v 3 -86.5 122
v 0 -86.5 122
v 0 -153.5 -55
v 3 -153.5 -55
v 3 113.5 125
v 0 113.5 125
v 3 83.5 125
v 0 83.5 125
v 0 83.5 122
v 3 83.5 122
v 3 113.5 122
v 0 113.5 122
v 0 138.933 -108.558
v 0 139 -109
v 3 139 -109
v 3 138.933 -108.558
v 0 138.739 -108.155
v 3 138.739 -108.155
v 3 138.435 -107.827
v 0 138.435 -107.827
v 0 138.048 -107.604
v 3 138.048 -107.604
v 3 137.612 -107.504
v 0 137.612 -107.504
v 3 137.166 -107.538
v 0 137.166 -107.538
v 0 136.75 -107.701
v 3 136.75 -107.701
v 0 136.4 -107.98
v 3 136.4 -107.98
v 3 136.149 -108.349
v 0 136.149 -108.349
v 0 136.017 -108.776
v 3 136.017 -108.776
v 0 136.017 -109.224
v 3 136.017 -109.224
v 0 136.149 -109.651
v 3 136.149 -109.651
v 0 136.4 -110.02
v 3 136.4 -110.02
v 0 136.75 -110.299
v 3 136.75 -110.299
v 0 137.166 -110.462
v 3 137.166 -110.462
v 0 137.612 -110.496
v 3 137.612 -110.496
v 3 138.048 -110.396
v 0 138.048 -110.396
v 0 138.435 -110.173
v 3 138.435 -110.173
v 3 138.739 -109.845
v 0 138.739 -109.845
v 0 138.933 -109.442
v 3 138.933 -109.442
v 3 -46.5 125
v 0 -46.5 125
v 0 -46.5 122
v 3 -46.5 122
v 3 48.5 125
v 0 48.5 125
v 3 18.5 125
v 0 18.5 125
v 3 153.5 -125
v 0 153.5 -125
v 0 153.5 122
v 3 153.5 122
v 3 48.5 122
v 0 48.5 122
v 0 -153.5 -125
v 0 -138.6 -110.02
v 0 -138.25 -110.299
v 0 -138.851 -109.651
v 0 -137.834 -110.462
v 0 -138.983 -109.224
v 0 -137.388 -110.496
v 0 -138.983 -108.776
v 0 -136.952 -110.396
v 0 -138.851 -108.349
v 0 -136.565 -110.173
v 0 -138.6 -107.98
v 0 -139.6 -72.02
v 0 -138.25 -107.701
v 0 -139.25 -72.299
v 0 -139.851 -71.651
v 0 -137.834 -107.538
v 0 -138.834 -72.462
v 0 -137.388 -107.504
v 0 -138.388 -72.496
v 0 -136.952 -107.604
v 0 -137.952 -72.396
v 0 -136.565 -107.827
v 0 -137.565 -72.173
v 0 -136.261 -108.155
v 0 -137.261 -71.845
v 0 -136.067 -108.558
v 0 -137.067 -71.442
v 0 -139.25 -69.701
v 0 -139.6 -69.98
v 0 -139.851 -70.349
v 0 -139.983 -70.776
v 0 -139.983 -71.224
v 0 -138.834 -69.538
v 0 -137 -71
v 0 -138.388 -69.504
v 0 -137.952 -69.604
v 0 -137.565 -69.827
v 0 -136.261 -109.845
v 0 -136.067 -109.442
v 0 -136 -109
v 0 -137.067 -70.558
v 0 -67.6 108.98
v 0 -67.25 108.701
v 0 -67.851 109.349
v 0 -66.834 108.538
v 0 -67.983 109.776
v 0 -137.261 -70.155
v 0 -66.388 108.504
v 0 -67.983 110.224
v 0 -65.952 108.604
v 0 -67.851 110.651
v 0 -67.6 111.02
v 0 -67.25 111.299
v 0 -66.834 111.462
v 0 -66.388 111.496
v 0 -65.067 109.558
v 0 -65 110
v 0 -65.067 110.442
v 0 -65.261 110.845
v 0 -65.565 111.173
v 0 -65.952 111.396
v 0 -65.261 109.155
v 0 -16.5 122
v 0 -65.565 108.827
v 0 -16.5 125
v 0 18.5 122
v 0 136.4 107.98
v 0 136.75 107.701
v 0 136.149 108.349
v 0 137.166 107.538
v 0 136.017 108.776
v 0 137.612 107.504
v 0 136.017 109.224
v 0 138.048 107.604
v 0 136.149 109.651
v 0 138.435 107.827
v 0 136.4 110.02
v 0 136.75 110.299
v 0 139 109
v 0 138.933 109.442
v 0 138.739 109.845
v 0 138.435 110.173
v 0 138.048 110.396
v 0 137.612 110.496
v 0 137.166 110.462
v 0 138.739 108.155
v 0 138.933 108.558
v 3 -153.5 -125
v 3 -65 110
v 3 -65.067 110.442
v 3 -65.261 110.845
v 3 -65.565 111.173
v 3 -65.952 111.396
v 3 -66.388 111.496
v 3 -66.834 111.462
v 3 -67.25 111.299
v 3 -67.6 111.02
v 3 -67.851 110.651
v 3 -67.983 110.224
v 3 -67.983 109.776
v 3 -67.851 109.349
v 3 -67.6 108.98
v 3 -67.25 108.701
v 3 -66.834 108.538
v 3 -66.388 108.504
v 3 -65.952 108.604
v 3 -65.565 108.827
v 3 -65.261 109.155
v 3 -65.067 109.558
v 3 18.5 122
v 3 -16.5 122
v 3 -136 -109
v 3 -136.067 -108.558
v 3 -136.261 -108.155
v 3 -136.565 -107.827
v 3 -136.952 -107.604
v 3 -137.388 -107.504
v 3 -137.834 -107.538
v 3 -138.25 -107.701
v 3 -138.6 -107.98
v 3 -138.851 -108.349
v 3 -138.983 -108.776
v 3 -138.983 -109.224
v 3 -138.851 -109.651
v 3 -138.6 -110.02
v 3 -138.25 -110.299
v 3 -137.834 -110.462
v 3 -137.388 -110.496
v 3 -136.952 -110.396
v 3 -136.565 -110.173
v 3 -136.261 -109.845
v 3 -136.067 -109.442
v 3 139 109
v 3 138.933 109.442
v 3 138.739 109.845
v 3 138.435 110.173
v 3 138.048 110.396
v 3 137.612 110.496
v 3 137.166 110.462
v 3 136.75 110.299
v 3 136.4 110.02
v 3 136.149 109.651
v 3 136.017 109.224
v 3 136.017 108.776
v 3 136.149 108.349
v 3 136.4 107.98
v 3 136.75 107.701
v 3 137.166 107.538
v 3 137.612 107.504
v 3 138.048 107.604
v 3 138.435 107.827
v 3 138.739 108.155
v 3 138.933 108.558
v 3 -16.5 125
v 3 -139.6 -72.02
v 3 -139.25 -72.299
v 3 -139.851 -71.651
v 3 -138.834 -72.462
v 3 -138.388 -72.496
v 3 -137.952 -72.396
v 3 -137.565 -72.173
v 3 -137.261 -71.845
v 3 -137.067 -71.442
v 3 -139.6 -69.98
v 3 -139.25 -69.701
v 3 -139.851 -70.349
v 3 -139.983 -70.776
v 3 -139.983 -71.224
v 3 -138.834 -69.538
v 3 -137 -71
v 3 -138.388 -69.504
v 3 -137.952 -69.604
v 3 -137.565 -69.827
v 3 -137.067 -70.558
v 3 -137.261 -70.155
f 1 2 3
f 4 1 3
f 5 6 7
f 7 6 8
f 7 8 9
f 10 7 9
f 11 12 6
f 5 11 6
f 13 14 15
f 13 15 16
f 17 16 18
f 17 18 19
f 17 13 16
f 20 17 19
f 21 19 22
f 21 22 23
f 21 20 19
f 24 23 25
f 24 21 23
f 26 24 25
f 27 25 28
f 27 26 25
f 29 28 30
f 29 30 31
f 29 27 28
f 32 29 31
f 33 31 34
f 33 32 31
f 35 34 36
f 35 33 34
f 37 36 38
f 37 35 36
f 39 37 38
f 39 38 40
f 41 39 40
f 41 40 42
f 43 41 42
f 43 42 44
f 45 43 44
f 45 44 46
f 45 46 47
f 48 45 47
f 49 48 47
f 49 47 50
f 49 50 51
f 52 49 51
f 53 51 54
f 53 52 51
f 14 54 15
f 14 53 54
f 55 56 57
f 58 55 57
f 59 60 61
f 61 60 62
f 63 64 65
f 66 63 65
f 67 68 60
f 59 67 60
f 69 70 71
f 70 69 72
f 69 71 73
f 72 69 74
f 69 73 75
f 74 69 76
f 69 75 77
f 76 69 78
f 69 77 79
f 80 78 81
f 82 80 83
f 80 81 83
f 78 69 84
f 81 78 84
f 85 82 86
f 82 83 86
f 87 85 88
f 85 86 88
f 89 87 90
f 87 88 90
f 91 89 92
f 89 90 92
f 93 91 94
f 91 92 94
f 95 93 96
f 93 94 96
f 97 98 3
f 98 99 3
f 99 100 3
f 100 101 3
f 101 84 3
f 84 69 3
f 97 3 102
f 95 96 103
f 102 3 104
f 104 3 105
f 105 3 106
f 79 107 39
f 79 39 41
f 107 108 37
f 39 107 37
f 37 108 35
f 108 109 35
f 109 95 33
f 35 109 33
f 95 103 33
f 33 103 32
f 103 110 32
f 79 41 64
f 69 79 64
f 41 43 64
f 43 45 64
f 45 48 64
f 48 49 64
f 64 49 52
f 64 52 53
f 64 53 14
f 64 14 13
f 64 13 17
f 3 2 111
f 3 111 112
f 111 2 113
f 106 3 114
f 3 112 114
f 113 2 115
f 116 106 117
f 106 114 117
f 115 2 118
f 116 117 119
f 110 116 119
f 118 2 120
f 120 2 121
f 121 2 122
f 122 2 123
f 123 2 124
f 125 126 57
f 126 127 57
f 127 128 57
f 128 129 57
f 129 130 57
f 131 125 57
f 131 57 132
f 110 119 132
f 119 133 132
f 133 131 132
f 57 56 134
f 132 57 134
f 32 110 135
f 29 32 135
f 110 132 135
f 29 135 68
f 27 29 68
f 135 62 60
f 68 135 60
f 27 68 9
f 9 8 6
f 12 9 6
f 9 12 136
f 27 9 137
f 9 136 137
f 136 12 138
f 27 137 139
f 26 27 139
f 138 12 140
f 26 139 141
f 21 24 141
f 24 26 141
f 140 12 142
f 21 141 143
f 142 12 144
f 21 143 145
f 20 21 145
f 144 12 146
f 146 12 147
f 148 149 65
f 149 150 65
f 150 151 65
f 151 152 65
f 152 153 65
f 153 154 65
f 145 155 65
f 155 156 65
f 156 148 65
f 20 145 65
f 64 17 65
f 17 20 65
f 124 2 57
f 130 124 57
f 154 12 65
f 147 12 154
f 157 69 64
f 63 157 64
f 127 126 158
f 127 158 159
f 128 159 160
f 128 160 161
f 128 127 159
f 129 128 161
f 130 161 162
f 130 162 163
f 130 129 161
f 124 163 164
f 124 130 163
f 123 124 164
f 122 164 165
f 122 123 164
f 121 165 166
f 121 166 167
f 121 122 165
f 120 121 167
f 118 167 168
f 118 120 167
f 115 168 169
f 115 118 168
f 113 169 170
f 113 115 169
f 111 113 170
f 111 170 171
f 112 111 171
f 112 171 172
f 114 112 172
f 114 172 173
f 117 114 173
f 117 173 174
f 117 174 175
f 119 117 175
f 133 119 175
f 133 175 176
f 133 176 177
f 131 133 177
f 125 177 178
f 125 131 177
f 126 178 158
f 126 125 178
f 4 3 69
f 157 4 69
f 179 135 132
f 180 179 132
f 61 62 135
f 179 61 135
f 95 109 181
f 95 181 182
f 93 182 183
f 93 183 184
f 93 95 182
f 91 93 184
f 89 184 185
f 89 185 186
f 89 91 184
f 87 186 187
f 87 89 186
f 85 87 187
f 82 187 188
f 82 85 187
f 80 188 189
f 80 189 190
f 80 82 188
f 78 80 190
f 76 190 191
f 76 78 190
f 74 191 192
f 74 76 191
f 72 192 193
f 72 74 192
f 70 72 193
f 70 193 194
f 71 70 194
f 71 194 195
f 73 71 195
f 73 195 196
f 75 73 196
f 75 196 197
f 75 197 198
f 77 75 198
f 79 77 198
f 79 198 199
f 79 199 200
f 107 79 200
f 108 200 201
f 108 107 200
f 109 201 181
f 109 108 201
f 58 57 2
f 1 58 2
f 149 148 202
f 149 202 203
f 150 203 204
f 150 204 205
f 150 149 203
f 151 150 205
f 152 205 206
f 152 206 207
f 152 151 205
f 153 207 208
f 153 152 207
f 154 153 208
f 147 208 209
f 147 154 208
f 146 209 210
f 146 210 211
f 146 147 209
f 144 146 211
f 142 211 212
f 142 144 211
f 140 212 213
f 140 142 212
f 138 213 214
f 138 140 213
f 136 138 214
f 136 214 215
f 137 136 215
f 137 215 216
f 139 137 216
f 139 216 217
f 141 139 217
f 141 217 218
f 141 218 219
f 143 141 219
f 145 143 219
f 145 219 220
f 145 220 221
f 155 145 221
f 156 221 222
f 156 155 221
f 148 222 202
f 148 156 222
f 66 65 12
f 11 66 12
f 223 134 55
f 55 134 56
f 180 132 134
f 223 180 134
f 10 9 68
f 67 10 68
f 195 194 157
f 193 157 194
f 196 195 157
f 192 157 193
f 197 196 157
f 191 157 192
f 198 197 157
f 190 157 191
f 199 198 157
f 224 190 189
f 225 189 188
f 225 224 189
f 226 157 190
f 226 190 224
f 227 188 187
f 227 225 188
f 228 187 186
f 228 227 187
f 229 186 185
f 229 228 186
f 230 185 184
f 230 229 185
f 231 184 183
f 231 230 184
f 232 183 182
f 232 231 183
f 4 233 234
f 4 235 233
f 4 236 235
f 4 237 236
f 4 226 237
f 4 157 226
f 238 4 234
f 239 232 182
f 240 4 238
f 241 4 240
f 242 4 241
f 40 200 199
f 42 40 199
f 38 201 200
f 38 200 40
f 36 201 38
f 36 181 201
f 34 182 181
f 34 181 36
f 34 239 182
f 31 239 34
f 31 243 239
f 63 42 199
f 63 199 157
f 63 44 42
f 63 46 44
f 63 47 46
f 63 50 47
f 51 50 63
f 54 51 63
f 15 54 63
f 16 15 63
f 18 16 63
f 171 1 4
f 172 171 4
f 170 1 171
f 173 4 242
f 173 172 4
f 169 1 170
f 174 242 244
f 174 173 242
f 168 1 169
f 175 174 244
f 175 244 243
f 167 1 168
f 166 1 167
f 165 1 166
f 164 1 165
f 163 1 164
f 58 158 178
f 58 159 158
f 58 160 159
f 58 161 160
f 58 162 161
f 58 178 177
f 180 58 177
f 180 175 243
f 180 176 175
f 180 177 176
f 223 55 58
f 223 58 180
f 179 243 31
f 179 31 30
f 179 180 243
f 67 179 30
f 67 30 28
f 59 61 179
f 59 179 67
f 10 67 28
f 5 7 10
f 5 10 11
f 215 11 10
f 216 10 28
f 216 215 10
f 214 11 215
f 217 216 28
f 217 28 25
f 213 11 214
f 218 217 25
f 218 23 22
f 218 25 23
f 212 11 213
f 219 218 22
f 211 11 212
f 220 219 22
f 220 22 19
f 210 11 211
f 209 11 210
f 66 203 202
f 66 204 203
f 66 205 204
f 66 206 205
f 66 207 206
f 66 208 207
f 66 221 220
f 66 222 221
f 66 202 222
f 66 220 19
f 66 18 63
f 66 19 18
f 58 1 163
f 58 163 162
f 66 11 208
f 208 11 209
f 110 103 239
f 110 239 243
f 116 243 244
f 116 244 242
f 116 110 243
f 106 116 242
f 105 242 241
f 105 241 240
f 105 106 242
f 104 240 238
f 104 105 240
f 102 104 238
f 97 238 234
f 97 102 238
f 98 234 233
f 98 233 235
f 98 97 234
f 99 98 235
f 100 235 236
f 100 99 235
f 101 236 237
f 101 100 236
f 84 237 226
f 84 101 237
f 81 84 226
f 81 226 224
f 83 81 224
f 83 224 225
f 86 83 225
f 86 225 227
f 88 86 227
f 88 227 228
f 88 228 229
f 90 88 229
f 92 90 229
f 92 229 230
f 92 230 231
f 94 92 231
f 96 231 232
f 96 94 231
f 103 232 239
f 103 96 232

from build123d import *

# Parameters (mm, degrees)
F0_R     = 1.5
F1_DEPTH = 3


with BuildPart() as f1:
    # F0 (on Right) → F1 (new body)
    with BuildSketch(Plane.YZ):
        Polygon((113.5, 122), (113.5, 125), (83.5, 125), (83.5, 122), (48.5, 122), (48.5, 125), (18.5, 125), (18.5, 122), (-16.5, 122), (-16.5, 125), (-46.5, 125), (-46.5, 122), (-86.5, 122), (-153.5, -55), (-153.5, -125), (153.5, -125), (153.5, 122), align=None)
        with Locations((-137.5, -109)):
            Circle(F0_R, mode=Mode.SUBTRACT)
        with Locations((-138.5, -71)):
            Circle(F0_R, mode=Mode.SUBTRACT)
        with Locations((137.5, -109)):
            Circle(F0_R, mode=Mode.SUBTRACT)
        with Locations((-66.5, 110)):
            Circle(F0_R, mode=Mode.SUBTRACT)
        with Locations((137.5, 109)):
            Circle(F0_R, mode=Mode.SUBTRACT)
    extrude(amount=F1_DEPTH)


solid = f1.part
